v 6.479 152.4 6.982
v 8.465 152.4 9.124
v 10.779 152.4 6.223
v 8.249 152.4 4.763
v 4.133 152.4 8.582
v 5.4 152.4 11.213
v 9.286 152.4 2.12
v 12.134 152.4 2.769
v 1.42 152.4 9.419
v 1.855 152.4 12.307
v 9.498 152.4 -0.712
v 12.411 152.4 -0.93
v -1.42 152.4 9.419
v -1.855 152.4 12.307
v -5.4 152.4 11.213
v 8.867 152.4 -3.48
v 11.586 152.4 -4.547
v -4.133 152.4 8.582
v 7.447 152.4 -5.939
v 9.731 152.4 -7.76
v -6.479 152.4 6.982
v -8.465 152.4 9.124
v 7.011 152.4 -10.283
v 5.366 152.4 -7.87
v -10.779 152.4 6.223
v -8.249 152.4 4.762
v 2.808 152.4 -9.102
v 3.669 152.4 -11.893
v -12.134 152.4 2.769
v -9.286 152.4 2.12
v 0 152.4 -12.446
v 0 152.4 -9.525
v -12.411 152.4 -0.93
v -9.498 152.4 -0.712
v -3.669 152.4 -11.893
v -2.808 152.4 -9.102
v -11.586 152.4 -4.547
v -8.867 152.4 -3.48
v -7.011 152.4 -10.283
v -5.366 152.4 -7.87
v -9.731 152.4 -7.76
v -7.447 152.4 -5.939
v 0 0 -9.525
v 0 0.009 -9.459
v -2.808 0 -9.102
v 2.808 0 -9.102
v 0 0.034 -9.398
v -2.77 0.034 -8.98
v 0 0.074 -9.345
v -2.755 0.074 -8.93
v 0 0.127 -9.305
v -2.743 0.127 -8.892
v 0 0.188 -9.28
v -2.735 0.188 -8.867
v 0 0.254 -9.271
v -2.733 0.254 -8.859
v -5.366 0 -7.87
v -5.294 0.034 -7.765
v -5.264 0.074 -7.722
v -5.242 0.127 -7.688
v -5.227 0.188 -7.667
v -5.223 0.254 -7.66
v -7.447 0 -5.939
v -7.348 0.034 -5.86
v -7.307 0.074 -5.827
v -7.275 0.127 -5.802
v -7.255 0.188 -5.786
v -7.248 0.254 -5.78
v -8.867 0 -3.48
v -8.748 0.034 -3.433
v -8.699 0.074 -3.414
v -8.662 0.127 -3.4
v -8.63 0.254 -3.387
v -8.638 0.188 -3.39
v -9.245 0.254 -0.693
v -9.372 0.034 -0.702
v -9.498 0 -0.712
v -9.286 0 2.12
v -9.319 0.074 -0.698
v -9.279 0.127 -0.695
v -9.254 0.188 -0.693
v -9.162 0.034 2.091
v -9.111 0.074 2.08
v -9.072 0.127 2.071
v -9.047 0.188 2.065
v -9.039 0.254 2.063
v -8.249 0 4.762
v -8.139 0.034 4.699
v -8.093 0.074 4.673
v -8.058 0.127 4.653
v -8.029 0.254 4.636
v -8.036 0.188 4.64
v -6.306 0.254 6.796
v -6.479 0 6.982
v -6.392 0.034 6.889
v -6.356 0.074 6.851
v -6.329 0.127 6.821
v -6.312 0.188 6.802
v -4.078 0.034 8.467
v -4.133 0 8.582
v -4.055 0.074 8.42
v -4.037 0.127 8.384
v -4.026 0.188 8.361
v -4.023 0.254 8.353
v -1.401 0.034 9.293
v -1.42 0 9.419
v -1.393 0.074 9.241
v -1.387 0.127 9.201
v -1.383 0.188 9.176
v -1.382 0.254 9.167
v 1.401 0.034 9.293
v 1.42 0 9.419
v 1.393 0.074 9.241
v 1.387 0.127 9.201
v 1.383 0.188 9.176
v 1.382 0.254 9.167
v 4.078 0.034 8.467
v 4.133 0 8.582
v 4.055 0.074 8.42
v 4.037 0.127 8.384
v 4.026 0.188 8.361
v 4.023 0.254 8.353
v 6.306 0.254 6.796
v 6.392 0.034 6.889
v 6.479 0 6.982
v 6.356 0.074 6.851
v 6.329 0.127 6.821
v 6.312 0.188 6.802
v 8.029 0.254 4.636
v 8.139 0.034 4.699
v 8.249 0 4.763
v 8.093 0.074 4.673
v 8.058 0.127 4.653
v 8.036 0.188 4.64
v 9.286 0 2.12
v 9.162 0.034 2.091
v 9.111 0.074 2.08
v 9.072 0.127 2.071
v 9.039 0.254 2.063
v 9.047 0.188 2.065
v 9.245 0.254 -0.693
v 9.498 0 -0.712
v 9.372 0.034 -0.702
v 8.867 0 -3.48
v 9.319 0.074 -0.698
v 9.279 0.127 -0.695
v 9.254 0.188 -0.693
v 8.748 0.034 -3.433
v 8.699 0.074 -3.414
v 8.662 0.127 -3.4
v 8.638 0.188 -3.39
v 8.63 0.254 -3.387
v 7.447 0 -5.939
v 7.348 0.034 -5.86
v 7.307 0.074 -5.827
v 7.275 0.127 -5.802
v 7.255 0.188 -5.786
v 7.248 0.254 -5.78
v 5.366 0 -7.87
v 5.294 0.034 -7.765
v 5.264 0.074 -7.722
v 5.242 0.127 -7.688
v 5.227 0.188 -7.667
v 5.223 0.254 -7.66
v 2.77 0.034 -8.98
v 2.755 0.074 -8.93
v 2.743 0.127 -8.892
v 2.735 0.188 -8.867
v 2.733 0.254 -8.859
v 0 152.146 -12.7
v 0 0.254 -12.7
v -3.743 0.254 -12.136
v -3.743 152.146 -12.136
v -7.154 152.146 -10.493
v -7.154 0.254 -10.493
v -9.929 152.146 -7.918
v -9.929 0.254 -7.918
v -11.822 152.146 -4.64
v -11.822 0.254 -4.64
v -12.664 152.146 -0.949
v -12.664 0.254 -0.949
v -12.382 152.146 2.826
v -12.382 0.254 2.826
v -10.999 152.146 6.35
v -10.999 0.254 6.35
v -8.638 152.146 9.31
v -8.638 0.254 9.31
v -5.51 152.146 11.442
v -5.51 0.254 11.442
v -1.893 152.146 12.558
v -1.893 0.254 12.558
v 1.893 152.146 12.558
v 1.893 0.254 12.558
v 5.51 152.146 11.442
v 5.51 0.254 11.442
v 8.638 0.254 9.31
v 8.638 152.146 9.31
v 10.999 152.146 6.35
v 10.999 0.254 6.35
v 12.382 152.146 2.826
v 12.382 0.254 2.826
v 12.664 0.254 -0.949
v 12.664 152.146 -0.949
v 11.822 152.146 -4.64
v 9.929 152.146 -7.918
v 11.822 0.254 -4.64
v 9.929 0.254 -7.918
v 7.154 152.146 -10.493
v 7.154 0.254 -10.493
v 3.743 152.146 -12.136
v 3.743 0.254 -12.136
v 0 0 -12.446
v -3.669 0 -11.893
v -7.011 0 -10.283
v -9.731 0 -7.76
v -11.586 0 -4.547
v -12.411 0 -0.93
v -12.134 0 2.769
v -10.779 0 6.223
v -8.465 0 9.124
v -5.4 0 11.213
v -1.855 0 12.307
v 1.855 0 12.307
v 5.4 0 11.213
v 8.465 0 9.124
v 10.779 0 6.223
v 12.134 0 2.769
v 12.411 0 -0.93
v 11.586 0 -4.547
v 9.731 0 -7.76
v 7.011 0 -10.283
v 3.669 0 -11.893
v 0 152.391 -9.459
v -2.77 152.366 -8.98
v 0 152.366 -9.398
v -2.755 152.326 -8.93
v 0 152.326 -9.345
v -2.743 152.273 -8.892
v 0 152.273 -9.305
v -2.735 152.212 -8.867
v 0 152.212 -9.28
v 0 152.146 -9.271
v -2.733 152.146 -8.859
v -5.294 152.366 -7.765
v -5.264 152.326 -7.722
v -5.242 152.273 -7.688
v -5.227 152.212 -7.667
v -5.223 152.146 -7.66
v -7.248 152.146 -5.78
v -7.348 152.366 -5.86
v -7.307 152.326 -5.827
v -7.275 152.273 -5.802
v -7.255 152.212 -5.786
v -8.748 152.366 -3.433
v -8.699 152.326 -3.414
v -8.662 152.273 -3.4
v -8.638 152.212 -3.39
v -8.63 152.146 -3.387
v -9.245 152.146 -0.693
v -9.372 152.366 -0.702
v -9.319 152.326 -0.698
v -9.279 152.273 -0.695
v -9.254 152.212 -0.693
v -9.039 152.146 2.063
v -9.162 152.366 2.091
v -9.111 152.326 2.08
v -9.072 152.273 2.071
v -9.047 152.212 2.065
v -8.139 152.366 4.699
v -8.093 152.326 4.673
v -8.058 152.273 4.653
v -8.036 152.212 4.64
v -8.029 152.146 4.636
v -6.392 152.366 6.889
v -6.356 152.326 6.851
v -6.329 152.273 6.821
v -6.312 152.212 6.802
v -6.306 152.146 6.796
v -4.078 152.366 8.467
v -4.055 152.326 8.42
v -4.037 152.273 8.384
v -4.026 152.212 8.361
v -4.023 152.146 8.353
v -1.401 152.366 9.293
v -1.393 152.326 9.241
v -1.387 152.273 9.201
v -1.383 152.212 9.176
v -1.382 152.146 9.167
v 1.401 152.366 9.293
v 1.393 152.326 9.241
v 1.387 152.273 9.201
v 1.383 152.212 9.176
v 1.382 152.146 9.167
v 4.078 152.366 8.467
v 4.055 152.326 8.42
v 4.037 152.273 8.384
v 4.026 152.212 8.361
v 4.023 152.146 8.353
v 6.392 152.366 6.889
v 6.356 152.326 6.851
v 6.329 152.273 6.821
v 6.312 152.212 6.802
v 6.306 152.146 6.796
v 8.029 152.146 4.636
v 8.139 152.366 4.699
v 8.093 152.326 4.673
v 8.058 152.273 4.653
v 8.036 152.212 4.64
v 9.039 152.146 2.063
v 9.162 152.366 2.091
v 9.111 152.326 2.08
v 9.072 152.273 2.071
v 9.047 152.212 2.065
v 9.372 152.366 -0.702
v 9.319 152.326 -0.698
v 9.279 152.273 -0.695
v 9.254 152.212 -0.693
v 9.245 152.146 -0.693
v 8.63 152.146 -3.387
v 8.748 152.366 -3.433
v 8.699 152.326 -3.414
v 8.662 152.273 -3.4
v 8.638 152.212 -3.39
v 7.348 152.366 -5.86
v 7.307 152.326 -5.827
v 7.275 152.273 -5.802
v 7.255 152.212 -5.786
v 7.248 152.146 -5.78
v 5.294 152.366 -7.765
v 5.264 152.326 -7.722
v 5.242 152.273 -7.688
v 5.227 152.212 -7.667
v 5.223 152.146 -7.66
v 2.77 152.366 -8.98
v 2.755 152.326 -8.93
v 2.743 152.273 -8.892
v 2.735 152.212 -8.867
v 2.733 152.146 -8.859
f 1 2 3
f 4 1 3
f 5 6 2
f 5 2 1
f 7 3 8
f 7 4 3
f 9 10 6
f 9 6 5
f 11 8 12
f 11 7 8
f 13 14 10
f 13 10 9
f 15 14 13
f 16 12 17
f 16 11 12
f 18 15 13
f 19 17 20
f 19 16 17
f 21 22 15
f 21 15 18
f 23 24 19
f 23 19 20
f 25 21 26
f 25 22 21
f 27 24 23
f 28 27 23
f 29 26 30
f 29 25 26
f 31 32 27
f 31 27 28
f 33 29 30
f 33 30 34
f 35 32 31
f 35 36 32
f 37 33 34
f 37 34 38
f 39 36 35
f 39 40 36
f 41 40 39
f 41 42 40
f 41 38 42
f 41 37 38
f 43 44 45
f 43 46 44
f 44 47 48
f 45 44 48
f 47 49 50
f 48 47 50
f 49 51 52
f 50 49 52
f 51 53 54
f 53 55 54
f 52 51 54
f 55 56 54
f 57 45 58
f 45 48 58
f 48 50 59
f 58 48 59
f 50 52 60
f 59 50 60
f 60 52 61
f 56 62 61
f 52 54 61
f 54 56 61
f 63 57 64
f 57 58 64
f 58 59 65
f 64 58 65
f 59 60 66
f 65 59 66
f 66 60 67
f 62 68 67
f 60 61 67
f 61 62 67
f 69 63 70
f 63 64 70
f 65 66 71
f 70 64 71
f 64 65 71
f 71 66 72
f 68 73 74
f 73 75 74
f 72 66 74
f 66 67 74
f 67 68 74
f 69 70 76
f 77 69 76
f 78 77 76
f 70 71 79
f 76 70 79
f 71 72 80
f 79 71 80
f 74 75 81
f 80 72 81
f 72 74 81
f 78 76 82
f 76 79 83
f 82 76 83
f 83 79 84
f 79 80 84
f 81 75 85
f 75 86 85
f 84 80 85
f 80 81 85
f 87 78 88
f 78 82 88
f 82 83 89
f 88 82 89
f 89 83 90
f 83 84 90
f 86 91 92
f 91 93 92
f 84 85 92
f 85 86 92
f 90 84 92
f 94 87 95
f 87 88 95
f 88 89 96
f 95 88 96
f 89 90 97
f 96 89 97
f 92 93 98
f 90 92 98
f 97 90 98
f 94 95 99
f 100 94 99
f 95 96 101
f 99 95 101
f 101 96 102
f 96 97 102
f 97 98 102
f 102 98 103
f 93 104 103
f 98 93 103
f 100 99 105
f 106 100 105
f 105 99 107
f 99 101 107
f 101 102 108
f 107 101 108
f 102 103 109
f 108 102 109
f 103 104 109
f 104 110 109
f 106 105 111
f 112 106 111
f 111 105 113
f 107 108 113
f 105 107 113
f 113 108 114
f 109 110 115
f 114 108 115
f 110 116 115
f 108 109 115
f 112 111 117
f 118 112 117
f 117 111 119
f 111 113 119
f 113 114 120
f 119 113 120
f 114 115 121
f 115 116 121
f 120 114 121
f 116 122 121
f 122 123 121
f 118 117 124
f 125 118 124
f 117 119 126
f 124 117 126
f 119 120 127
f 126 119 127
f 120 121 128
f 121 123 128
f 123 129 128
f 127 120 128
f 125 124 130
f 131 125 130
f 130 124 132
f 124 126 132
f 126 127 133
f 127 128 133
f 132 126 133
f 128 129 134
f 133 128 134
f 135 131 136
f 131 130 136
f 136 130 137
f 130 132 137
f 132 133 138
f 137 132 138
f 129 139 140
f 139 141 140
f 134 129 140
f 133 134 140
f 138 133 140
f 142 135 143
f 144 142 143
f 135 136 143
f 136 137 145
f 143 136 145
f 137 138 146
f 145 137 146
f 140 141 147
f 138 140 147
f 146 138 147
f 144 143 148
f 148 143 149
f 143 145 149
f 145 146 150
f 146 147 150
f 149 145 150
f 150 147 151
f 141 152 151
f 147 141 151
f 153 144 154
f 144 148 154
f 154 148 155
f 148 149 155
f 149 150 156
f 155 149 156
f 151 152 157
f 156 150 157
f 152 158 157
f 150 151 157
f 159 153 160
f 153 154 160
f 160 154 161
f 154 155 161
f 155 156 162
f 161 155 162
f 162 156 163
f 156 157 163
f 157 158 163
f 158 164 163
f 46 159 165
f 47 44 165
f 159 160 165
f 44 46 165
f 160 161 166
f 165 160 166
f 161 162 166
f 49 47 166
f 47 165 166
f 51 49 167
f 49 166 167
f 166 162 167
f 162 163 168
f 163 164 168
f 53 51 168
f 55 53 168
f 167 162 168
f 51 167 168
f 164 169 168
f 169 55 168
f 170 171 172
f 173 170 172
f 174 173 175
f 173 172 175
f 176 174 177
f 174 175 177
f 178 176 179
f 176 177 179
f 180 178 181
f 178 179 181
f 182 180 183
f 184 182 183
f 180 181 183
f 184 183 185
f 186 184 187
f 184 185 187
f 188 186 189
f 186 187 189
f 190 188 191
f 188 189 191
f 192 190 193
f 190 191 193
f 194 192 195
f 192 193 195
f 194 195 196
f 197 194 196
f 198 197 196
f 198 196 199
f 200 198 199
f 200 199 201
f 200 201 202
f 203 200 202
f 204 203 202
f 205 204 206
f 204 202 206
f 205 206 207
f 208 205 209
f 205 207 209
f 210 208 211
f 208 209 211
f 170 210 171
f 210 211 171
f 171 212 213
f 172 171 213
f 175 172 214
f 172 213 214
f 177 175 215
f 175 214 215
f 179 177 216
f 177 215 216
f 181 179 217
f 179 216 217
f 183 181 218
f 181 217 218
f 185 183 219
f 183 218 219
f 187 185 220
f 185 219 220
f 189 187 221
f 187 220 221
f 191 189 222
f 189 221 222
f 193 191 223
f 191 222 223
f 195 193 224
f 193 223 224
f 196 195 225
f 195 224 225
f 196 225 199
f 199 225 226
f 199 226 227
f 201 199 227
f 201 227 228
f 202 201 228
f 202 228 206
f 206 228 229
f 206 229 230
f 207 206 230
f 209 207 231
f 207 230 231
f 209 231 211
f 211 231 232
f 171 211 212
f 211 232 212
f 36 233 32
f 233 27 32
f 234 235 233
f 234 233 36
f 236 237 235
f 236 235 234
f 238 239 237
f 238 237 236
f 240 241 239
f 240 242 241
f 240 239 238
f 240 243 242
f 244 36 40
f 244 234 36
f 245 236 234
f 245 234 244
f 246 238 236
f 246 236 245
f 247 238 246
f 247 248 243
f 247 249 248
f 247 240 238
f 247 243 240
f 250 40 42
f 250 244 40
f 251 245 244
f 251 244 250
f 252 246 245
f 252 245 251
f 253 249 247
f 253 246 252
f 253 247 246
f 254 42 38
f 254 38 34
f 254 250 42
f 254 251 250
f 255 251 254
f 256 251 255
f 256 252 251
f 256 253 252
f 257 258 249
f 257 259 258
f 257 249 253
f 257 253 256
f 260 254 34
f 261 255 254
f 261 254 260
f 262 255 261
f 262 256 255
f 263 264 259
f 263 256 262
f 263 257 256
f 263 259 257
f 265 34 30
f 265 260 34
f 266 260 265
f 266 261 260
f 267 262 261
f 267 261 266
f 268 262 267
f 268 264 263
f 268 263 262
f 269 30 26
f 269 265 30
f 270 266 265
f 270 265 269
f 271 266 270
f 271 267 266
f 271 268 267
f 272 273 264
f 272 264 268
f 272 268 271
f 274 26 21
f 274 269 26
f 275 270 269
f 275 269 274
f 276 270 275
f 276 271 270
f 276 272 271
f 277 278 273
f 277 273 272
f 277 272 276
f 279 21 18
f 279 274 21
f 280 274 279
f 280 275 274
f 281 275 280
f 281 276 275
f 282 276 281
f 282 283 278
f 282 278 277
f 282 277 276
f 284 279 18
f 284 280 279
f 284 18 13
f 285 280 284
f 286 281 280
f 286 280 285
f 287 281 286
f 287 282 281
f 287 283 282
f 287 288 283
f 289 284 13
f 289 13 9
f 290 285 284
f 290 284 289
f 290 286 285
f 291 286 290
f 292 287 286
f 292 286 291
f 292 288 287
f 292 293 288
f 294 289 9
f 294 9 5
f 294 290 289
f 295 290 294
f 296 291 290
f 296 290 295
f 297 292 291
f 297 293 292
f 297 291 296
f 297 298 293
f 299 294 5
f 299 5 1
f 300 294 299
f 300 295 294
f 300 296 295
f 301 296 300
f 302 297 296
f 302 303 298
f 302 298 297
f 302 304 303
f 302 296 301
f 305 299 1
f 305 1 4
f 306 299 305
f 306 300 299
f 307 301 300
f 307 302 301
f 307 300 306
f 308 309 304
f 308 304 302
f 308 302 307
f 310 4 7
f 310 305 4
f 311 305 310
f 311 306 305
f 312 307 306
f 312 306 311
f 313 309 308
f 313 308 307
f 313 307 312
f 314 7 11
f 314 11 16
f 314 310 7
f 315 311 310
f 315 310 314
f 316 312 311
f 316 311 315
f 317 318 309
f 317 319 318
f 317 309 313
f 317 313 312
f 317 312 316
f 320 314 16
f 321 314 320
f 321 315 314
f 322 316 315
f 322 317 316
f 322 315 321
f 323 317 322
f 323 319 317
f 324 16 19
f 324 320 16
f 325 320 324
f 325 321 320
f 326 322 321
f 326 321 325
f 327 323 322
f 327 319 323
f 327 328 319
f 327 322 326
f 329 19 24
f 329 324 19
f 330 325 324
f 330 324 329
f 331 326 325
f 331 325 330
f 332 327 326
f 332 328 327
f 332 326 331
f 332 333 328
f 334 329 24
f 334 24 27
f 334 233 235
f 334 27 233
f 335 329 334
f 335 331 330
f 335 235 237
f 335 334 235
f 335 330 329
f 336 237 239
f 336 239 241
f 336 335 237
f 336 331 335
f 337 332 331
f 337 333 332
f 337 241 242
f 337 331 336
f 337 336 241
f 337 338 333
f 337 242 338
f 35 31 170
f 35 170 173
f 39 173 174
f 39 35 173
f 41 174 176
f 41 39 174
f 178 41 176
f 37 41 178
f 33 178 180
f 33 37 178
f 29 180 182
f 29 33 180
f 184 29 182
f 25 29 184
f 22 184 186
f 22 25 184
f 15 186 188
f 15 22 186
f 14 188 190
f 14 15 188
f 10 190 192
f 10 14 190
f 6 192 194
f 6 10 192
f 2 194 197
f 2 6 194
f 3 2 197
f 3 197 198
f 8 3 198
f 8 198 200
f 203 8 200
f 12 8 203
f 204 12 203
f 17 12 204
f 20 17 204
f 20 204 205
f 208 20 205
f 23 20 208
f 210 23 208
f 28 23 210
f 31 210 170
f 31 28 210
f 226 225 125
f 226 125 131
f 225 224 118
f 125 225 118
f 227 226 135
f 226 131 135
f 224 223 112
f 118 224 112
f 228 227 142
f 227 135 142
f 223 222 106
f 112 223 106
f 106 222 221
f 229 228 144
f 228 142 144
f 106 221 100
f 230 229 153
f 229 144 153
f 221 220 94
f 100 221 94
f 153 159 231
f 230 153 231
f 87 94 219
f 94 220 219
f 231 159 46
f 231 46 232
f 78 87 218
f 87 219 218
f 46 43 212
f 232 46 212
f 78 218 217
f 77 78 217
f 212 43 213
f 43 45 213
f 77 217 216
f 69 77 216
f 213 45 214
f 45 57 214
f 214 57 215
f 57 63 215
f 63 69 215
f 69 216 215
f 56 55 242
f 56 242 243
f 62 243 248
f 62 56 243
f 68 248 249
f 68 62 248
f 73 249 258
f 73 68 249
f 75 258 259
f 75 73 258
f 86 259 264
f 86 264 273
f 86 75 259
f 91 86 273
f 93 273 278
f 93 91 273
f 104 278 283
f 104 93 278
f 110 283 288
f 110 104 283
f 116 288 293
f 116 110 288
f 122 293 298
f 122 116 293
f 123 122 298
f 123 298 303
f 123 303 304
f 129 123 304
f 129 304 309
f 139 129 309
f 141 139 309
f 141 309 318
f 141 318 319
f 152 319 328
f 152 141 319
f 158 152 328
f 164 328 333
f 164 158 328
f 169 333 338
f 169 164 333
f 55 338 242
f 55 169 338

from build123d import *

# Parameters (mm, degrees)
SKETCH1_R           = 12.7
SKETCH1_R_2         = 9.271
BOSS_EXTRUDE1_DEPTH = 152.4
CHAMFER1_SIZE       = 0.254
FILLET1_R           = 0.254


with BuildPart() as part:
    # Sketch1 → Boss-Extrude1 (new body)
    with BuildSketch(Plane(origin=(0, 0, 0), x_dir=(1, 0, 0), z_dir=(0, 1, 0))):
        with Locations(Location((0, 0, 0), (0, 0, 90))):
            Circle(SKETCH1_R)
        with Locations(Location((0, 0, 0), (0, 0, 90))):
            Circle(SKETCH1_R_2, mode=Mode.SUBTRACT)
    extrude(amount=BOSS_EXTRUDE1_DEPTH)

    # Chamfer1
    chamfer1_edges = [part.edges().sort_by_distance(p)[0] for p in [
        (0, 0, 12.7),
        (0, 152.4, 12.7),
    ]]
    chamfer(chamfer1_edges, length=CHAMFER1_SIZE)

    # Fillet1
    fillet1_edges = [part.edges().sort_by_distance(p)[0] for p in [
        (0, 0, 9.271),
        (0, 152.4, 9.271),
    ]]
    fillet(fillet1_edges, radius=FILLET1_R)


solid = part.part
